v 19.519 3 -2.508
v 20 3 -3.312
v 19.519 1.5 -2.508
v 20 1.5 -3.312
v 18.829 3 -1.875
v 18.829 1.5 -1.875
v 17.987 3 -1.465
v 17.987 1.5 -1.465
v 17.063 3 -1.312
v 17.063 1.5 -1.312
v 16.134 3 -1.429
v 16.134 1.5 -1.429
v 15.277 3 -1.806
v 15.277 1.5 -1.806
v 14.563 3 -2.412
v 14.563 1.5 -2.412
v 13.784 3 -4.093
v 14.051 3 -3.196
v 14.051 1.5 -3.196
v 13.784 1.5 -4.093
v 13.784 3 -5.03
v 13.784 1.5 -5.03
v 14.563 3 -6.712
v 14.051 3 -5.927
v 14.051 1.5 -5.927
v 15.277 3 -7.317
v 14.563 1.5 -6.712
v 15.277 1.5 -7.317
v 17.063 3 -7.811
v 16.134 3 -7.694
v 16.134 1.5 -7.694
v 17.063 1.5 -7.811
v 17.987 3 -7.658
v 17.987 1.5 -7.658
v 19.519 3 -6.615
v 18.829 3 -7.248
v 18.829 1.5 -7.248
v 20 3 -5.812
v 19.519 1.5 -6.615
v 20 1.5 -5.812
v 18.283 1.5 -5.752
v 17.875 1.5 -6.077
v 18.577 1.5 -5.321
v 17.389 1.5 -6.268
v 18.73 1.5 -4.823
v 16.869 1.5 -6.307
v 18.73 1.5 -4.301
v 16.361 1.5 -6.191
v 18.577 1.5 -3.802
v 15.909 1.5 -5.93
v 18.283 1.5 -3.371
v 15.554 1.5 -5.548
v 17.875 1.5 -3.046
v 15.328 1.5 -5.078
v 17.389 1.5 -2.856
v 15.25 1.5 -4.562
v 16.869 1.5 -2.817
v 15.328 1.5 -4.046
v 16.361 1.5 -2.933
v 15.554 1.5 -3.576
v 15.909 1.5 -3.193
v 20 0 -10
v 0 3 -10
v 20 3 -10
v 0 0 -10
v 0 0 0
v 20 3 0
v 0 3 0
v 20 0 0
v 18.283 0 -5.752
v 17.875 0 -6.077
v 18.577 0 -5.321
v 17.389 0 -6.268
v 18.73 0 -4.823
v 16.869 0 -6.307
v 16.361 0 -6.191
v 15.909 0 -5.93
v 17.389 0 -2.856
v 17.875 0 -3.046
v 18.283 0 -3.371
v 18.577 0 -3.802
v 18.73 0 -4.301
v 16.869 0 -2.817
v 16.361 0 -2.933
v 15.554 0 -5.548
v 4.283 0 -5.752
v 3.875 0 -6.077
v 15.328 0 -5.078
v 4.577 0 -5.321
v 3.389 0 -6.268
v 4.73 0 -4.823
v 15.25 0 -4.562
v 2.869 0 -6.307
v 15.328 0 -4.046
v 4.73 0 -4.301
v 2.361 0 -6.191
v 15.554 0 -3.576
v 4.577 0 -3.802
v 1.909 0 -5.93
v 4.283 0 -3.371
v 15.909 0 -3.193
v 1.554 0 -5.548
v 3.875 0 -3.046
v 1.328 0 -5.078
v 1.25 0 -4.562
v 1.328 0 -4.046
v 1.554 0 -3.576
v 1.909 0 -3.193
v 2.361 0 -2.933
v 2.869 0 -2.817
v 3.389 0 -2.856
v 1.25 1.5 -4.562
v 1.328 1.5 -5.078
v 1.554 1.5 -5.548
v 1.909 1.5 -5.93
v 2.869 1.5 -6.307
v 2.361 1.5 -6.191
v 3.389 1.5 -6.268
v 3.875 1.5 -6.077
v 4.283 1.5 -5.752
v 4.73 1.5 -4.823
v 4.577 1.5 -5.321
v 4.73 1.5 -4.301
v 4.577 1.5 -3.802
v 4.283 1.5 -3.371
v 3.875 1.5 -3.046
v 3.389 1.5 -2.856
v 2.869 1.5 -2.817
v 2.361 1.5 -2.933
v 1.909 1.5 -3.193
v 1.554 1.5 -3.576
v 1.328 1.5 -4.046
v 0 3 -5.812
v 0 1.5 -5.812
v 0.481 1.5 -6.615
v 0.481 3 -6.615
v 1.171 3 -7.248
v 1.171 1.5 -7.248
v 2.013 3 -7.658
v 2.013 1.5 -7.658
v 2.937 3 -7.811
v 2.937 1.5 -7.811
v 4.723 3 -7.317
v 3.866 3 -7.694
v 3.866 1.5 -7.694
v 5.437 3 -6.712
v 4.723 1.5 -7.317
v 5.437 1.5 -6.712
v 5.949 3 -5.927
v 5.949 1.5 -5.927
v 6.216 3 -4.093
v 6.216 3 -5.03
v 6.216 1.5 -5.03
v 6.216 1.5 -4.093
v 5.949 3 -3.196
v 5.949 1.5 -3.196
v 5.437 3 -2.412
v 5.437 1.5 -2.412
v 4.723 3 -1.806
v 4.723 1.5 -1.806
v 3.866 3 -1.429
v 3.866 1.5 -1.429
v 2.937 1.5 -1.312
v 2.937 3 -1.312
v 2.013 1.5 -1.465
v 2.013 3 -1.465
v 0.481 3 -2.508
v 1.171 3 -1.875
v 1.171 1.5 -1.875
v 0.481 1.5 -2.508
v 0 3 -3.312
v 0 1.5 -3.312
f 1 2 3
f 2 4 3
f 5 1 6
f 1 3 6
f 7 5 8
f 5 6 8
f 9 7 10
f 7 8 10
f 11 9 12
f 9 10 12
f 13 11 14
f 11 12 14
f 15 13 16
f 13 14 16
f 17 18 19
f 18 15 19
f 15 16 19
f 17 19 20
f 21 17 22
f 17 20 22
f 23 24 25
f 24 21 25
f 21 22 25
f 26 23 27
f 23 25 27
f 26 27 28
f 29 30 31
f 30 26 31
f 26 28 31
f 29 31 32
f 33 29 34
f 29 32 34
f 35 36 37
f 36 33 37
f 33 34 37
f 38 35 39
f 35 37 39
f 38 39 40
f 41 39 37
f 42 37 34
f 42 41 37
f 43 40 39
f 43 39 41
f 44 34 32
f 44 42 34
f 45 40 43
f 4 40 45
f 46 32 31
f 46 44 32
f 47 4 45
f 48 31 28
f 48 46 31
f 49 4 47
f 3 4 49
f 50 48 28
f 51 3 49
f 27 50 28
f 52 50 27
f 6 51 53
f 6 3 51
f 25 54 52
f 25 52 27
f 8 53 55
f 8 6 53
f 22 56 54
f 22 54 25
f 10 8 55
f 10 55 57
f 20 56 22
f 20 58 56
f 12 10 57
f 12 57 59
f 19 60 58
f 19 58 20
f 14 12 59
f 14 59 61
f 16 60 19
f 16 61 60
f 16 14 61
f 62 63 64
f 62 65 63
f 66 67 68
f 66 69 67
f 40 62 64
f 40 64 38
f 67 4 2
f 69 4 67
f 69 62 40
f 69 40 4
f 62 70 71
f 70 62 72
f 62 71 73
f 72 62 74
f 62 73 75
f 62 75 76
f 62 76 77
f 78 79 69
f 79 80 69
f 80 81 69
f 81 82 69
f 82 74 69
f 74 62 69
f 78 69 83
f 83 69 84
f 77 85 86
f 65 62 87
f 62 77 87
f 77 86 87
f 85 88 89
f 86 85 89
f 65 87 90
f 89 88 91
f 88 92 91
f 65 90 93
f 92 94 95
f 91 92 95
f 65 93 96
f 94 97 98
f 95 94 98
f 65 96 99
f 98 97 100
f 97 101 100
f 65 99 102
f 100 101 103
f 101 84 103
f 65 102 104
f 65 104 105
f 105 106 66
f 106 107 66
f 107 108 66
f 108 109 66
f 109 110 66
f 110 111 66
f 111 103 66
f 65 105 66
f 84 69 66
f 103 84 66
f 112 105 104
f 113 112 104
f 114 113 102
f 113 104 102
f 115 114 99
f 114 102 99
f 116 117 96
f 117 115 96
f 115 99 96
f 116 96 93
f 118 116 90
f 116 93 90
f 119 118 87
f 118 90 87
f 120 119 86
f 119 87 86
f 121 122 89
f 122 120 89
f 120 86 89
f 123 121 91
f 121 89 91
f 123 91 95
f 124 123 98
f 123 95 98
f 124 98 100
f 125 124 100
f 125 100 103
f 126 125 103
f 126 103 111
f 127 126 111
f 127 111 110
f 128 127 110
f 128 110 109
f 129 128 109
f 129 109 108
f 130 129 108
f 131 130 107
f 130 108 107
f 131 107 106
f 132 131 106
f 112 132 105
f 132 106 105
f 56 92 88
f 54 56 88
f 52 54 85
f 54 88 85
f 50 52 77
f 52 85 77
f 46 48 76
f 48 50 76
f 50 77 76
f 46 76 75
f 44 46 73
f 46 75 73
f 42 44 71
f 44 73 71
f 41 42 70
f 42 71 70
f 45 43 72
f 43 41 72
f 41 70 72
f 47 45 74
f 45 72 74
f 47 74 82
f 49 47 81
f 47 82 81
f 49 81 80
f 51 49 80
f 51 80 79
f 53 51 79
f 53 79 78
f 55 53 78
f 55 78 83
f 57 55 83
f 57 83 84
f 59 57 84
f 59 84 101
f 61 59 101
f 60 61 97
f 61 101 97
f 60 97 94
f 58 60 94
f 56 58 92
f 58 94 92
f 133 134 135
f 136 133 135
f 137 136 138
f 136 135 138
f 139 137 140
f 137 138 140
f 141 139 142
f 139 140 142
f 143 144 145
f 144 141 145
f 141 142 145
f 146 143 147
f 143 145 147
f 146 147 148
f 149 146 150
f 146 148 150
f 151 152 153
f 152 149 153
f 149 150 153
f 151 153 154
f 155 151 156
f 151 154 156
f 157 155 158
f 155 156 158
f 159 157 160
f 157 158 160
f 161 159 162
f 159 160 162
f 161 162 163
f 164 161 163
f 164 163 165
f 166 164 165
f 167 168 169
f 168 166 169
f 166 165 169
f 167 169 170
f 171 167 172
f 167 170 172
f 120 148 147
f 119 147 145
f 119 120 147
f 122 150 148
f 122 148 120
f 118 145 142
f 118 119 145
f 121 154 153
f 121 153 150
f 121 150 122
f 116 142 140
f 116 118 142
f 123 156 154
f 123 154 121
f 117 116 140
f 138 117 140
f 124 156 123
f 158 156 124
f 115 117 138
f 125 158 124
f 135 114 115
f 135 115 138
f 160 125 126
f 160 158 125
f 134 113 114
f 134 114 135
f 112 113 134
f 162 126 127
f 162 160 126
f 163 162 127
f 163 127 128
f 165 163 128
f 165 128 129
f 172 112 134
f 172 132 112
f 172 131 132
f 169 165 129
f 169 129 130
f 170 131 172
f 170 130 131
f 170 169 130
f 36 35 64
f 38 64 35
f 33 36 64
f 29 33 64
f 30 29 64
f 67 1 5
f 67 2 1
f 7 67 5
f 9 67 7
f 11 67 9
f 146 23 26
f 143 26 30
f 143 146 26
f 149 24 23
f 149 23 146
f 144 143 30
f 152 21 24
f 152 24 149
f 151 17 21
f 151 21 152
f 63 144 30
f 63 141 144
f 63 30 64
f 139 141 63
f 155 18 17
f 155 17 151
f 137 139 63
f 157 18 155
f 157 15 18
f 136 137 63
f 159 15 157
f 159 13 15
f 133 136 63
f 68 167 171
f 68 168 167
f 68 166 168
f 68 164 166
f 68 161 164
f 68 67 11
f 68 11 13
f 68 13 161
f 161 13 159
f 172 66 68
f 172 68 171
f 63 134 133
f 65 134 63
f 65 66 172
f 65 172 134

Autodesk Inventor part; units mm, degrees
ref_plane "YZ Plane" through (0, 0, 0) normal (1, 0, 0) x (0, 1, 0)
ref_plane "XZ Plane" through (0, 0, 0) normal (0, 1, 0) x (-1, 0, 0)
ref_plane "XY Plane" through (0, 0, 0) normal (0, 0, 1) x (1, 0, 0)
sketch "Sketch1" plane through (0, 0, 0) normal (0, 1, 0) x (-1, 0, 0)
  line L0 (0, 0) -> (0, -10)
  line L1 (0, -10) -> (-20, -10)
  line L2 (-20, -10) -> (-20, 0)
  line L3 (-20, 0) -> (0, 0)
  arc A0 (0, -3.3117) -> (0, -5.8117) centre (-3, -4.5617) ccw
  arc A1 (-20, -5.8117) -> (-20, -3.3117) centre (-17, -4.5617) ccw
  line L4 (-10, 0) -> (-10, -10) construction
  circle A2 centre (-3, -4.5617) radius 1.75
  circle A3 centre (-17, -4.5617) radius 1.75
  dimension "d2" = 10
  dimension "d3" = 20
  dimension "d5" = 6.5
  dimension "d8" = 7
  dimension "d9" = 7
  dimension "d11" = 3.5
  dimension "d12" = 3.5
  dimension "d13" = 10
  dimension "d14" = 3.3117
  dimension "d15" = 4.5617
extrude "Extrusion1" add sketch "Sketch1" along normal blind 1.5 contours L0 A0 | A1 L2
extrude "Extrusion2" add sketch "Sketch1" along normal blind 3 contours L0 A0 L1 L2 A1 L3
properties part number "reverse gear bearing keeper"
